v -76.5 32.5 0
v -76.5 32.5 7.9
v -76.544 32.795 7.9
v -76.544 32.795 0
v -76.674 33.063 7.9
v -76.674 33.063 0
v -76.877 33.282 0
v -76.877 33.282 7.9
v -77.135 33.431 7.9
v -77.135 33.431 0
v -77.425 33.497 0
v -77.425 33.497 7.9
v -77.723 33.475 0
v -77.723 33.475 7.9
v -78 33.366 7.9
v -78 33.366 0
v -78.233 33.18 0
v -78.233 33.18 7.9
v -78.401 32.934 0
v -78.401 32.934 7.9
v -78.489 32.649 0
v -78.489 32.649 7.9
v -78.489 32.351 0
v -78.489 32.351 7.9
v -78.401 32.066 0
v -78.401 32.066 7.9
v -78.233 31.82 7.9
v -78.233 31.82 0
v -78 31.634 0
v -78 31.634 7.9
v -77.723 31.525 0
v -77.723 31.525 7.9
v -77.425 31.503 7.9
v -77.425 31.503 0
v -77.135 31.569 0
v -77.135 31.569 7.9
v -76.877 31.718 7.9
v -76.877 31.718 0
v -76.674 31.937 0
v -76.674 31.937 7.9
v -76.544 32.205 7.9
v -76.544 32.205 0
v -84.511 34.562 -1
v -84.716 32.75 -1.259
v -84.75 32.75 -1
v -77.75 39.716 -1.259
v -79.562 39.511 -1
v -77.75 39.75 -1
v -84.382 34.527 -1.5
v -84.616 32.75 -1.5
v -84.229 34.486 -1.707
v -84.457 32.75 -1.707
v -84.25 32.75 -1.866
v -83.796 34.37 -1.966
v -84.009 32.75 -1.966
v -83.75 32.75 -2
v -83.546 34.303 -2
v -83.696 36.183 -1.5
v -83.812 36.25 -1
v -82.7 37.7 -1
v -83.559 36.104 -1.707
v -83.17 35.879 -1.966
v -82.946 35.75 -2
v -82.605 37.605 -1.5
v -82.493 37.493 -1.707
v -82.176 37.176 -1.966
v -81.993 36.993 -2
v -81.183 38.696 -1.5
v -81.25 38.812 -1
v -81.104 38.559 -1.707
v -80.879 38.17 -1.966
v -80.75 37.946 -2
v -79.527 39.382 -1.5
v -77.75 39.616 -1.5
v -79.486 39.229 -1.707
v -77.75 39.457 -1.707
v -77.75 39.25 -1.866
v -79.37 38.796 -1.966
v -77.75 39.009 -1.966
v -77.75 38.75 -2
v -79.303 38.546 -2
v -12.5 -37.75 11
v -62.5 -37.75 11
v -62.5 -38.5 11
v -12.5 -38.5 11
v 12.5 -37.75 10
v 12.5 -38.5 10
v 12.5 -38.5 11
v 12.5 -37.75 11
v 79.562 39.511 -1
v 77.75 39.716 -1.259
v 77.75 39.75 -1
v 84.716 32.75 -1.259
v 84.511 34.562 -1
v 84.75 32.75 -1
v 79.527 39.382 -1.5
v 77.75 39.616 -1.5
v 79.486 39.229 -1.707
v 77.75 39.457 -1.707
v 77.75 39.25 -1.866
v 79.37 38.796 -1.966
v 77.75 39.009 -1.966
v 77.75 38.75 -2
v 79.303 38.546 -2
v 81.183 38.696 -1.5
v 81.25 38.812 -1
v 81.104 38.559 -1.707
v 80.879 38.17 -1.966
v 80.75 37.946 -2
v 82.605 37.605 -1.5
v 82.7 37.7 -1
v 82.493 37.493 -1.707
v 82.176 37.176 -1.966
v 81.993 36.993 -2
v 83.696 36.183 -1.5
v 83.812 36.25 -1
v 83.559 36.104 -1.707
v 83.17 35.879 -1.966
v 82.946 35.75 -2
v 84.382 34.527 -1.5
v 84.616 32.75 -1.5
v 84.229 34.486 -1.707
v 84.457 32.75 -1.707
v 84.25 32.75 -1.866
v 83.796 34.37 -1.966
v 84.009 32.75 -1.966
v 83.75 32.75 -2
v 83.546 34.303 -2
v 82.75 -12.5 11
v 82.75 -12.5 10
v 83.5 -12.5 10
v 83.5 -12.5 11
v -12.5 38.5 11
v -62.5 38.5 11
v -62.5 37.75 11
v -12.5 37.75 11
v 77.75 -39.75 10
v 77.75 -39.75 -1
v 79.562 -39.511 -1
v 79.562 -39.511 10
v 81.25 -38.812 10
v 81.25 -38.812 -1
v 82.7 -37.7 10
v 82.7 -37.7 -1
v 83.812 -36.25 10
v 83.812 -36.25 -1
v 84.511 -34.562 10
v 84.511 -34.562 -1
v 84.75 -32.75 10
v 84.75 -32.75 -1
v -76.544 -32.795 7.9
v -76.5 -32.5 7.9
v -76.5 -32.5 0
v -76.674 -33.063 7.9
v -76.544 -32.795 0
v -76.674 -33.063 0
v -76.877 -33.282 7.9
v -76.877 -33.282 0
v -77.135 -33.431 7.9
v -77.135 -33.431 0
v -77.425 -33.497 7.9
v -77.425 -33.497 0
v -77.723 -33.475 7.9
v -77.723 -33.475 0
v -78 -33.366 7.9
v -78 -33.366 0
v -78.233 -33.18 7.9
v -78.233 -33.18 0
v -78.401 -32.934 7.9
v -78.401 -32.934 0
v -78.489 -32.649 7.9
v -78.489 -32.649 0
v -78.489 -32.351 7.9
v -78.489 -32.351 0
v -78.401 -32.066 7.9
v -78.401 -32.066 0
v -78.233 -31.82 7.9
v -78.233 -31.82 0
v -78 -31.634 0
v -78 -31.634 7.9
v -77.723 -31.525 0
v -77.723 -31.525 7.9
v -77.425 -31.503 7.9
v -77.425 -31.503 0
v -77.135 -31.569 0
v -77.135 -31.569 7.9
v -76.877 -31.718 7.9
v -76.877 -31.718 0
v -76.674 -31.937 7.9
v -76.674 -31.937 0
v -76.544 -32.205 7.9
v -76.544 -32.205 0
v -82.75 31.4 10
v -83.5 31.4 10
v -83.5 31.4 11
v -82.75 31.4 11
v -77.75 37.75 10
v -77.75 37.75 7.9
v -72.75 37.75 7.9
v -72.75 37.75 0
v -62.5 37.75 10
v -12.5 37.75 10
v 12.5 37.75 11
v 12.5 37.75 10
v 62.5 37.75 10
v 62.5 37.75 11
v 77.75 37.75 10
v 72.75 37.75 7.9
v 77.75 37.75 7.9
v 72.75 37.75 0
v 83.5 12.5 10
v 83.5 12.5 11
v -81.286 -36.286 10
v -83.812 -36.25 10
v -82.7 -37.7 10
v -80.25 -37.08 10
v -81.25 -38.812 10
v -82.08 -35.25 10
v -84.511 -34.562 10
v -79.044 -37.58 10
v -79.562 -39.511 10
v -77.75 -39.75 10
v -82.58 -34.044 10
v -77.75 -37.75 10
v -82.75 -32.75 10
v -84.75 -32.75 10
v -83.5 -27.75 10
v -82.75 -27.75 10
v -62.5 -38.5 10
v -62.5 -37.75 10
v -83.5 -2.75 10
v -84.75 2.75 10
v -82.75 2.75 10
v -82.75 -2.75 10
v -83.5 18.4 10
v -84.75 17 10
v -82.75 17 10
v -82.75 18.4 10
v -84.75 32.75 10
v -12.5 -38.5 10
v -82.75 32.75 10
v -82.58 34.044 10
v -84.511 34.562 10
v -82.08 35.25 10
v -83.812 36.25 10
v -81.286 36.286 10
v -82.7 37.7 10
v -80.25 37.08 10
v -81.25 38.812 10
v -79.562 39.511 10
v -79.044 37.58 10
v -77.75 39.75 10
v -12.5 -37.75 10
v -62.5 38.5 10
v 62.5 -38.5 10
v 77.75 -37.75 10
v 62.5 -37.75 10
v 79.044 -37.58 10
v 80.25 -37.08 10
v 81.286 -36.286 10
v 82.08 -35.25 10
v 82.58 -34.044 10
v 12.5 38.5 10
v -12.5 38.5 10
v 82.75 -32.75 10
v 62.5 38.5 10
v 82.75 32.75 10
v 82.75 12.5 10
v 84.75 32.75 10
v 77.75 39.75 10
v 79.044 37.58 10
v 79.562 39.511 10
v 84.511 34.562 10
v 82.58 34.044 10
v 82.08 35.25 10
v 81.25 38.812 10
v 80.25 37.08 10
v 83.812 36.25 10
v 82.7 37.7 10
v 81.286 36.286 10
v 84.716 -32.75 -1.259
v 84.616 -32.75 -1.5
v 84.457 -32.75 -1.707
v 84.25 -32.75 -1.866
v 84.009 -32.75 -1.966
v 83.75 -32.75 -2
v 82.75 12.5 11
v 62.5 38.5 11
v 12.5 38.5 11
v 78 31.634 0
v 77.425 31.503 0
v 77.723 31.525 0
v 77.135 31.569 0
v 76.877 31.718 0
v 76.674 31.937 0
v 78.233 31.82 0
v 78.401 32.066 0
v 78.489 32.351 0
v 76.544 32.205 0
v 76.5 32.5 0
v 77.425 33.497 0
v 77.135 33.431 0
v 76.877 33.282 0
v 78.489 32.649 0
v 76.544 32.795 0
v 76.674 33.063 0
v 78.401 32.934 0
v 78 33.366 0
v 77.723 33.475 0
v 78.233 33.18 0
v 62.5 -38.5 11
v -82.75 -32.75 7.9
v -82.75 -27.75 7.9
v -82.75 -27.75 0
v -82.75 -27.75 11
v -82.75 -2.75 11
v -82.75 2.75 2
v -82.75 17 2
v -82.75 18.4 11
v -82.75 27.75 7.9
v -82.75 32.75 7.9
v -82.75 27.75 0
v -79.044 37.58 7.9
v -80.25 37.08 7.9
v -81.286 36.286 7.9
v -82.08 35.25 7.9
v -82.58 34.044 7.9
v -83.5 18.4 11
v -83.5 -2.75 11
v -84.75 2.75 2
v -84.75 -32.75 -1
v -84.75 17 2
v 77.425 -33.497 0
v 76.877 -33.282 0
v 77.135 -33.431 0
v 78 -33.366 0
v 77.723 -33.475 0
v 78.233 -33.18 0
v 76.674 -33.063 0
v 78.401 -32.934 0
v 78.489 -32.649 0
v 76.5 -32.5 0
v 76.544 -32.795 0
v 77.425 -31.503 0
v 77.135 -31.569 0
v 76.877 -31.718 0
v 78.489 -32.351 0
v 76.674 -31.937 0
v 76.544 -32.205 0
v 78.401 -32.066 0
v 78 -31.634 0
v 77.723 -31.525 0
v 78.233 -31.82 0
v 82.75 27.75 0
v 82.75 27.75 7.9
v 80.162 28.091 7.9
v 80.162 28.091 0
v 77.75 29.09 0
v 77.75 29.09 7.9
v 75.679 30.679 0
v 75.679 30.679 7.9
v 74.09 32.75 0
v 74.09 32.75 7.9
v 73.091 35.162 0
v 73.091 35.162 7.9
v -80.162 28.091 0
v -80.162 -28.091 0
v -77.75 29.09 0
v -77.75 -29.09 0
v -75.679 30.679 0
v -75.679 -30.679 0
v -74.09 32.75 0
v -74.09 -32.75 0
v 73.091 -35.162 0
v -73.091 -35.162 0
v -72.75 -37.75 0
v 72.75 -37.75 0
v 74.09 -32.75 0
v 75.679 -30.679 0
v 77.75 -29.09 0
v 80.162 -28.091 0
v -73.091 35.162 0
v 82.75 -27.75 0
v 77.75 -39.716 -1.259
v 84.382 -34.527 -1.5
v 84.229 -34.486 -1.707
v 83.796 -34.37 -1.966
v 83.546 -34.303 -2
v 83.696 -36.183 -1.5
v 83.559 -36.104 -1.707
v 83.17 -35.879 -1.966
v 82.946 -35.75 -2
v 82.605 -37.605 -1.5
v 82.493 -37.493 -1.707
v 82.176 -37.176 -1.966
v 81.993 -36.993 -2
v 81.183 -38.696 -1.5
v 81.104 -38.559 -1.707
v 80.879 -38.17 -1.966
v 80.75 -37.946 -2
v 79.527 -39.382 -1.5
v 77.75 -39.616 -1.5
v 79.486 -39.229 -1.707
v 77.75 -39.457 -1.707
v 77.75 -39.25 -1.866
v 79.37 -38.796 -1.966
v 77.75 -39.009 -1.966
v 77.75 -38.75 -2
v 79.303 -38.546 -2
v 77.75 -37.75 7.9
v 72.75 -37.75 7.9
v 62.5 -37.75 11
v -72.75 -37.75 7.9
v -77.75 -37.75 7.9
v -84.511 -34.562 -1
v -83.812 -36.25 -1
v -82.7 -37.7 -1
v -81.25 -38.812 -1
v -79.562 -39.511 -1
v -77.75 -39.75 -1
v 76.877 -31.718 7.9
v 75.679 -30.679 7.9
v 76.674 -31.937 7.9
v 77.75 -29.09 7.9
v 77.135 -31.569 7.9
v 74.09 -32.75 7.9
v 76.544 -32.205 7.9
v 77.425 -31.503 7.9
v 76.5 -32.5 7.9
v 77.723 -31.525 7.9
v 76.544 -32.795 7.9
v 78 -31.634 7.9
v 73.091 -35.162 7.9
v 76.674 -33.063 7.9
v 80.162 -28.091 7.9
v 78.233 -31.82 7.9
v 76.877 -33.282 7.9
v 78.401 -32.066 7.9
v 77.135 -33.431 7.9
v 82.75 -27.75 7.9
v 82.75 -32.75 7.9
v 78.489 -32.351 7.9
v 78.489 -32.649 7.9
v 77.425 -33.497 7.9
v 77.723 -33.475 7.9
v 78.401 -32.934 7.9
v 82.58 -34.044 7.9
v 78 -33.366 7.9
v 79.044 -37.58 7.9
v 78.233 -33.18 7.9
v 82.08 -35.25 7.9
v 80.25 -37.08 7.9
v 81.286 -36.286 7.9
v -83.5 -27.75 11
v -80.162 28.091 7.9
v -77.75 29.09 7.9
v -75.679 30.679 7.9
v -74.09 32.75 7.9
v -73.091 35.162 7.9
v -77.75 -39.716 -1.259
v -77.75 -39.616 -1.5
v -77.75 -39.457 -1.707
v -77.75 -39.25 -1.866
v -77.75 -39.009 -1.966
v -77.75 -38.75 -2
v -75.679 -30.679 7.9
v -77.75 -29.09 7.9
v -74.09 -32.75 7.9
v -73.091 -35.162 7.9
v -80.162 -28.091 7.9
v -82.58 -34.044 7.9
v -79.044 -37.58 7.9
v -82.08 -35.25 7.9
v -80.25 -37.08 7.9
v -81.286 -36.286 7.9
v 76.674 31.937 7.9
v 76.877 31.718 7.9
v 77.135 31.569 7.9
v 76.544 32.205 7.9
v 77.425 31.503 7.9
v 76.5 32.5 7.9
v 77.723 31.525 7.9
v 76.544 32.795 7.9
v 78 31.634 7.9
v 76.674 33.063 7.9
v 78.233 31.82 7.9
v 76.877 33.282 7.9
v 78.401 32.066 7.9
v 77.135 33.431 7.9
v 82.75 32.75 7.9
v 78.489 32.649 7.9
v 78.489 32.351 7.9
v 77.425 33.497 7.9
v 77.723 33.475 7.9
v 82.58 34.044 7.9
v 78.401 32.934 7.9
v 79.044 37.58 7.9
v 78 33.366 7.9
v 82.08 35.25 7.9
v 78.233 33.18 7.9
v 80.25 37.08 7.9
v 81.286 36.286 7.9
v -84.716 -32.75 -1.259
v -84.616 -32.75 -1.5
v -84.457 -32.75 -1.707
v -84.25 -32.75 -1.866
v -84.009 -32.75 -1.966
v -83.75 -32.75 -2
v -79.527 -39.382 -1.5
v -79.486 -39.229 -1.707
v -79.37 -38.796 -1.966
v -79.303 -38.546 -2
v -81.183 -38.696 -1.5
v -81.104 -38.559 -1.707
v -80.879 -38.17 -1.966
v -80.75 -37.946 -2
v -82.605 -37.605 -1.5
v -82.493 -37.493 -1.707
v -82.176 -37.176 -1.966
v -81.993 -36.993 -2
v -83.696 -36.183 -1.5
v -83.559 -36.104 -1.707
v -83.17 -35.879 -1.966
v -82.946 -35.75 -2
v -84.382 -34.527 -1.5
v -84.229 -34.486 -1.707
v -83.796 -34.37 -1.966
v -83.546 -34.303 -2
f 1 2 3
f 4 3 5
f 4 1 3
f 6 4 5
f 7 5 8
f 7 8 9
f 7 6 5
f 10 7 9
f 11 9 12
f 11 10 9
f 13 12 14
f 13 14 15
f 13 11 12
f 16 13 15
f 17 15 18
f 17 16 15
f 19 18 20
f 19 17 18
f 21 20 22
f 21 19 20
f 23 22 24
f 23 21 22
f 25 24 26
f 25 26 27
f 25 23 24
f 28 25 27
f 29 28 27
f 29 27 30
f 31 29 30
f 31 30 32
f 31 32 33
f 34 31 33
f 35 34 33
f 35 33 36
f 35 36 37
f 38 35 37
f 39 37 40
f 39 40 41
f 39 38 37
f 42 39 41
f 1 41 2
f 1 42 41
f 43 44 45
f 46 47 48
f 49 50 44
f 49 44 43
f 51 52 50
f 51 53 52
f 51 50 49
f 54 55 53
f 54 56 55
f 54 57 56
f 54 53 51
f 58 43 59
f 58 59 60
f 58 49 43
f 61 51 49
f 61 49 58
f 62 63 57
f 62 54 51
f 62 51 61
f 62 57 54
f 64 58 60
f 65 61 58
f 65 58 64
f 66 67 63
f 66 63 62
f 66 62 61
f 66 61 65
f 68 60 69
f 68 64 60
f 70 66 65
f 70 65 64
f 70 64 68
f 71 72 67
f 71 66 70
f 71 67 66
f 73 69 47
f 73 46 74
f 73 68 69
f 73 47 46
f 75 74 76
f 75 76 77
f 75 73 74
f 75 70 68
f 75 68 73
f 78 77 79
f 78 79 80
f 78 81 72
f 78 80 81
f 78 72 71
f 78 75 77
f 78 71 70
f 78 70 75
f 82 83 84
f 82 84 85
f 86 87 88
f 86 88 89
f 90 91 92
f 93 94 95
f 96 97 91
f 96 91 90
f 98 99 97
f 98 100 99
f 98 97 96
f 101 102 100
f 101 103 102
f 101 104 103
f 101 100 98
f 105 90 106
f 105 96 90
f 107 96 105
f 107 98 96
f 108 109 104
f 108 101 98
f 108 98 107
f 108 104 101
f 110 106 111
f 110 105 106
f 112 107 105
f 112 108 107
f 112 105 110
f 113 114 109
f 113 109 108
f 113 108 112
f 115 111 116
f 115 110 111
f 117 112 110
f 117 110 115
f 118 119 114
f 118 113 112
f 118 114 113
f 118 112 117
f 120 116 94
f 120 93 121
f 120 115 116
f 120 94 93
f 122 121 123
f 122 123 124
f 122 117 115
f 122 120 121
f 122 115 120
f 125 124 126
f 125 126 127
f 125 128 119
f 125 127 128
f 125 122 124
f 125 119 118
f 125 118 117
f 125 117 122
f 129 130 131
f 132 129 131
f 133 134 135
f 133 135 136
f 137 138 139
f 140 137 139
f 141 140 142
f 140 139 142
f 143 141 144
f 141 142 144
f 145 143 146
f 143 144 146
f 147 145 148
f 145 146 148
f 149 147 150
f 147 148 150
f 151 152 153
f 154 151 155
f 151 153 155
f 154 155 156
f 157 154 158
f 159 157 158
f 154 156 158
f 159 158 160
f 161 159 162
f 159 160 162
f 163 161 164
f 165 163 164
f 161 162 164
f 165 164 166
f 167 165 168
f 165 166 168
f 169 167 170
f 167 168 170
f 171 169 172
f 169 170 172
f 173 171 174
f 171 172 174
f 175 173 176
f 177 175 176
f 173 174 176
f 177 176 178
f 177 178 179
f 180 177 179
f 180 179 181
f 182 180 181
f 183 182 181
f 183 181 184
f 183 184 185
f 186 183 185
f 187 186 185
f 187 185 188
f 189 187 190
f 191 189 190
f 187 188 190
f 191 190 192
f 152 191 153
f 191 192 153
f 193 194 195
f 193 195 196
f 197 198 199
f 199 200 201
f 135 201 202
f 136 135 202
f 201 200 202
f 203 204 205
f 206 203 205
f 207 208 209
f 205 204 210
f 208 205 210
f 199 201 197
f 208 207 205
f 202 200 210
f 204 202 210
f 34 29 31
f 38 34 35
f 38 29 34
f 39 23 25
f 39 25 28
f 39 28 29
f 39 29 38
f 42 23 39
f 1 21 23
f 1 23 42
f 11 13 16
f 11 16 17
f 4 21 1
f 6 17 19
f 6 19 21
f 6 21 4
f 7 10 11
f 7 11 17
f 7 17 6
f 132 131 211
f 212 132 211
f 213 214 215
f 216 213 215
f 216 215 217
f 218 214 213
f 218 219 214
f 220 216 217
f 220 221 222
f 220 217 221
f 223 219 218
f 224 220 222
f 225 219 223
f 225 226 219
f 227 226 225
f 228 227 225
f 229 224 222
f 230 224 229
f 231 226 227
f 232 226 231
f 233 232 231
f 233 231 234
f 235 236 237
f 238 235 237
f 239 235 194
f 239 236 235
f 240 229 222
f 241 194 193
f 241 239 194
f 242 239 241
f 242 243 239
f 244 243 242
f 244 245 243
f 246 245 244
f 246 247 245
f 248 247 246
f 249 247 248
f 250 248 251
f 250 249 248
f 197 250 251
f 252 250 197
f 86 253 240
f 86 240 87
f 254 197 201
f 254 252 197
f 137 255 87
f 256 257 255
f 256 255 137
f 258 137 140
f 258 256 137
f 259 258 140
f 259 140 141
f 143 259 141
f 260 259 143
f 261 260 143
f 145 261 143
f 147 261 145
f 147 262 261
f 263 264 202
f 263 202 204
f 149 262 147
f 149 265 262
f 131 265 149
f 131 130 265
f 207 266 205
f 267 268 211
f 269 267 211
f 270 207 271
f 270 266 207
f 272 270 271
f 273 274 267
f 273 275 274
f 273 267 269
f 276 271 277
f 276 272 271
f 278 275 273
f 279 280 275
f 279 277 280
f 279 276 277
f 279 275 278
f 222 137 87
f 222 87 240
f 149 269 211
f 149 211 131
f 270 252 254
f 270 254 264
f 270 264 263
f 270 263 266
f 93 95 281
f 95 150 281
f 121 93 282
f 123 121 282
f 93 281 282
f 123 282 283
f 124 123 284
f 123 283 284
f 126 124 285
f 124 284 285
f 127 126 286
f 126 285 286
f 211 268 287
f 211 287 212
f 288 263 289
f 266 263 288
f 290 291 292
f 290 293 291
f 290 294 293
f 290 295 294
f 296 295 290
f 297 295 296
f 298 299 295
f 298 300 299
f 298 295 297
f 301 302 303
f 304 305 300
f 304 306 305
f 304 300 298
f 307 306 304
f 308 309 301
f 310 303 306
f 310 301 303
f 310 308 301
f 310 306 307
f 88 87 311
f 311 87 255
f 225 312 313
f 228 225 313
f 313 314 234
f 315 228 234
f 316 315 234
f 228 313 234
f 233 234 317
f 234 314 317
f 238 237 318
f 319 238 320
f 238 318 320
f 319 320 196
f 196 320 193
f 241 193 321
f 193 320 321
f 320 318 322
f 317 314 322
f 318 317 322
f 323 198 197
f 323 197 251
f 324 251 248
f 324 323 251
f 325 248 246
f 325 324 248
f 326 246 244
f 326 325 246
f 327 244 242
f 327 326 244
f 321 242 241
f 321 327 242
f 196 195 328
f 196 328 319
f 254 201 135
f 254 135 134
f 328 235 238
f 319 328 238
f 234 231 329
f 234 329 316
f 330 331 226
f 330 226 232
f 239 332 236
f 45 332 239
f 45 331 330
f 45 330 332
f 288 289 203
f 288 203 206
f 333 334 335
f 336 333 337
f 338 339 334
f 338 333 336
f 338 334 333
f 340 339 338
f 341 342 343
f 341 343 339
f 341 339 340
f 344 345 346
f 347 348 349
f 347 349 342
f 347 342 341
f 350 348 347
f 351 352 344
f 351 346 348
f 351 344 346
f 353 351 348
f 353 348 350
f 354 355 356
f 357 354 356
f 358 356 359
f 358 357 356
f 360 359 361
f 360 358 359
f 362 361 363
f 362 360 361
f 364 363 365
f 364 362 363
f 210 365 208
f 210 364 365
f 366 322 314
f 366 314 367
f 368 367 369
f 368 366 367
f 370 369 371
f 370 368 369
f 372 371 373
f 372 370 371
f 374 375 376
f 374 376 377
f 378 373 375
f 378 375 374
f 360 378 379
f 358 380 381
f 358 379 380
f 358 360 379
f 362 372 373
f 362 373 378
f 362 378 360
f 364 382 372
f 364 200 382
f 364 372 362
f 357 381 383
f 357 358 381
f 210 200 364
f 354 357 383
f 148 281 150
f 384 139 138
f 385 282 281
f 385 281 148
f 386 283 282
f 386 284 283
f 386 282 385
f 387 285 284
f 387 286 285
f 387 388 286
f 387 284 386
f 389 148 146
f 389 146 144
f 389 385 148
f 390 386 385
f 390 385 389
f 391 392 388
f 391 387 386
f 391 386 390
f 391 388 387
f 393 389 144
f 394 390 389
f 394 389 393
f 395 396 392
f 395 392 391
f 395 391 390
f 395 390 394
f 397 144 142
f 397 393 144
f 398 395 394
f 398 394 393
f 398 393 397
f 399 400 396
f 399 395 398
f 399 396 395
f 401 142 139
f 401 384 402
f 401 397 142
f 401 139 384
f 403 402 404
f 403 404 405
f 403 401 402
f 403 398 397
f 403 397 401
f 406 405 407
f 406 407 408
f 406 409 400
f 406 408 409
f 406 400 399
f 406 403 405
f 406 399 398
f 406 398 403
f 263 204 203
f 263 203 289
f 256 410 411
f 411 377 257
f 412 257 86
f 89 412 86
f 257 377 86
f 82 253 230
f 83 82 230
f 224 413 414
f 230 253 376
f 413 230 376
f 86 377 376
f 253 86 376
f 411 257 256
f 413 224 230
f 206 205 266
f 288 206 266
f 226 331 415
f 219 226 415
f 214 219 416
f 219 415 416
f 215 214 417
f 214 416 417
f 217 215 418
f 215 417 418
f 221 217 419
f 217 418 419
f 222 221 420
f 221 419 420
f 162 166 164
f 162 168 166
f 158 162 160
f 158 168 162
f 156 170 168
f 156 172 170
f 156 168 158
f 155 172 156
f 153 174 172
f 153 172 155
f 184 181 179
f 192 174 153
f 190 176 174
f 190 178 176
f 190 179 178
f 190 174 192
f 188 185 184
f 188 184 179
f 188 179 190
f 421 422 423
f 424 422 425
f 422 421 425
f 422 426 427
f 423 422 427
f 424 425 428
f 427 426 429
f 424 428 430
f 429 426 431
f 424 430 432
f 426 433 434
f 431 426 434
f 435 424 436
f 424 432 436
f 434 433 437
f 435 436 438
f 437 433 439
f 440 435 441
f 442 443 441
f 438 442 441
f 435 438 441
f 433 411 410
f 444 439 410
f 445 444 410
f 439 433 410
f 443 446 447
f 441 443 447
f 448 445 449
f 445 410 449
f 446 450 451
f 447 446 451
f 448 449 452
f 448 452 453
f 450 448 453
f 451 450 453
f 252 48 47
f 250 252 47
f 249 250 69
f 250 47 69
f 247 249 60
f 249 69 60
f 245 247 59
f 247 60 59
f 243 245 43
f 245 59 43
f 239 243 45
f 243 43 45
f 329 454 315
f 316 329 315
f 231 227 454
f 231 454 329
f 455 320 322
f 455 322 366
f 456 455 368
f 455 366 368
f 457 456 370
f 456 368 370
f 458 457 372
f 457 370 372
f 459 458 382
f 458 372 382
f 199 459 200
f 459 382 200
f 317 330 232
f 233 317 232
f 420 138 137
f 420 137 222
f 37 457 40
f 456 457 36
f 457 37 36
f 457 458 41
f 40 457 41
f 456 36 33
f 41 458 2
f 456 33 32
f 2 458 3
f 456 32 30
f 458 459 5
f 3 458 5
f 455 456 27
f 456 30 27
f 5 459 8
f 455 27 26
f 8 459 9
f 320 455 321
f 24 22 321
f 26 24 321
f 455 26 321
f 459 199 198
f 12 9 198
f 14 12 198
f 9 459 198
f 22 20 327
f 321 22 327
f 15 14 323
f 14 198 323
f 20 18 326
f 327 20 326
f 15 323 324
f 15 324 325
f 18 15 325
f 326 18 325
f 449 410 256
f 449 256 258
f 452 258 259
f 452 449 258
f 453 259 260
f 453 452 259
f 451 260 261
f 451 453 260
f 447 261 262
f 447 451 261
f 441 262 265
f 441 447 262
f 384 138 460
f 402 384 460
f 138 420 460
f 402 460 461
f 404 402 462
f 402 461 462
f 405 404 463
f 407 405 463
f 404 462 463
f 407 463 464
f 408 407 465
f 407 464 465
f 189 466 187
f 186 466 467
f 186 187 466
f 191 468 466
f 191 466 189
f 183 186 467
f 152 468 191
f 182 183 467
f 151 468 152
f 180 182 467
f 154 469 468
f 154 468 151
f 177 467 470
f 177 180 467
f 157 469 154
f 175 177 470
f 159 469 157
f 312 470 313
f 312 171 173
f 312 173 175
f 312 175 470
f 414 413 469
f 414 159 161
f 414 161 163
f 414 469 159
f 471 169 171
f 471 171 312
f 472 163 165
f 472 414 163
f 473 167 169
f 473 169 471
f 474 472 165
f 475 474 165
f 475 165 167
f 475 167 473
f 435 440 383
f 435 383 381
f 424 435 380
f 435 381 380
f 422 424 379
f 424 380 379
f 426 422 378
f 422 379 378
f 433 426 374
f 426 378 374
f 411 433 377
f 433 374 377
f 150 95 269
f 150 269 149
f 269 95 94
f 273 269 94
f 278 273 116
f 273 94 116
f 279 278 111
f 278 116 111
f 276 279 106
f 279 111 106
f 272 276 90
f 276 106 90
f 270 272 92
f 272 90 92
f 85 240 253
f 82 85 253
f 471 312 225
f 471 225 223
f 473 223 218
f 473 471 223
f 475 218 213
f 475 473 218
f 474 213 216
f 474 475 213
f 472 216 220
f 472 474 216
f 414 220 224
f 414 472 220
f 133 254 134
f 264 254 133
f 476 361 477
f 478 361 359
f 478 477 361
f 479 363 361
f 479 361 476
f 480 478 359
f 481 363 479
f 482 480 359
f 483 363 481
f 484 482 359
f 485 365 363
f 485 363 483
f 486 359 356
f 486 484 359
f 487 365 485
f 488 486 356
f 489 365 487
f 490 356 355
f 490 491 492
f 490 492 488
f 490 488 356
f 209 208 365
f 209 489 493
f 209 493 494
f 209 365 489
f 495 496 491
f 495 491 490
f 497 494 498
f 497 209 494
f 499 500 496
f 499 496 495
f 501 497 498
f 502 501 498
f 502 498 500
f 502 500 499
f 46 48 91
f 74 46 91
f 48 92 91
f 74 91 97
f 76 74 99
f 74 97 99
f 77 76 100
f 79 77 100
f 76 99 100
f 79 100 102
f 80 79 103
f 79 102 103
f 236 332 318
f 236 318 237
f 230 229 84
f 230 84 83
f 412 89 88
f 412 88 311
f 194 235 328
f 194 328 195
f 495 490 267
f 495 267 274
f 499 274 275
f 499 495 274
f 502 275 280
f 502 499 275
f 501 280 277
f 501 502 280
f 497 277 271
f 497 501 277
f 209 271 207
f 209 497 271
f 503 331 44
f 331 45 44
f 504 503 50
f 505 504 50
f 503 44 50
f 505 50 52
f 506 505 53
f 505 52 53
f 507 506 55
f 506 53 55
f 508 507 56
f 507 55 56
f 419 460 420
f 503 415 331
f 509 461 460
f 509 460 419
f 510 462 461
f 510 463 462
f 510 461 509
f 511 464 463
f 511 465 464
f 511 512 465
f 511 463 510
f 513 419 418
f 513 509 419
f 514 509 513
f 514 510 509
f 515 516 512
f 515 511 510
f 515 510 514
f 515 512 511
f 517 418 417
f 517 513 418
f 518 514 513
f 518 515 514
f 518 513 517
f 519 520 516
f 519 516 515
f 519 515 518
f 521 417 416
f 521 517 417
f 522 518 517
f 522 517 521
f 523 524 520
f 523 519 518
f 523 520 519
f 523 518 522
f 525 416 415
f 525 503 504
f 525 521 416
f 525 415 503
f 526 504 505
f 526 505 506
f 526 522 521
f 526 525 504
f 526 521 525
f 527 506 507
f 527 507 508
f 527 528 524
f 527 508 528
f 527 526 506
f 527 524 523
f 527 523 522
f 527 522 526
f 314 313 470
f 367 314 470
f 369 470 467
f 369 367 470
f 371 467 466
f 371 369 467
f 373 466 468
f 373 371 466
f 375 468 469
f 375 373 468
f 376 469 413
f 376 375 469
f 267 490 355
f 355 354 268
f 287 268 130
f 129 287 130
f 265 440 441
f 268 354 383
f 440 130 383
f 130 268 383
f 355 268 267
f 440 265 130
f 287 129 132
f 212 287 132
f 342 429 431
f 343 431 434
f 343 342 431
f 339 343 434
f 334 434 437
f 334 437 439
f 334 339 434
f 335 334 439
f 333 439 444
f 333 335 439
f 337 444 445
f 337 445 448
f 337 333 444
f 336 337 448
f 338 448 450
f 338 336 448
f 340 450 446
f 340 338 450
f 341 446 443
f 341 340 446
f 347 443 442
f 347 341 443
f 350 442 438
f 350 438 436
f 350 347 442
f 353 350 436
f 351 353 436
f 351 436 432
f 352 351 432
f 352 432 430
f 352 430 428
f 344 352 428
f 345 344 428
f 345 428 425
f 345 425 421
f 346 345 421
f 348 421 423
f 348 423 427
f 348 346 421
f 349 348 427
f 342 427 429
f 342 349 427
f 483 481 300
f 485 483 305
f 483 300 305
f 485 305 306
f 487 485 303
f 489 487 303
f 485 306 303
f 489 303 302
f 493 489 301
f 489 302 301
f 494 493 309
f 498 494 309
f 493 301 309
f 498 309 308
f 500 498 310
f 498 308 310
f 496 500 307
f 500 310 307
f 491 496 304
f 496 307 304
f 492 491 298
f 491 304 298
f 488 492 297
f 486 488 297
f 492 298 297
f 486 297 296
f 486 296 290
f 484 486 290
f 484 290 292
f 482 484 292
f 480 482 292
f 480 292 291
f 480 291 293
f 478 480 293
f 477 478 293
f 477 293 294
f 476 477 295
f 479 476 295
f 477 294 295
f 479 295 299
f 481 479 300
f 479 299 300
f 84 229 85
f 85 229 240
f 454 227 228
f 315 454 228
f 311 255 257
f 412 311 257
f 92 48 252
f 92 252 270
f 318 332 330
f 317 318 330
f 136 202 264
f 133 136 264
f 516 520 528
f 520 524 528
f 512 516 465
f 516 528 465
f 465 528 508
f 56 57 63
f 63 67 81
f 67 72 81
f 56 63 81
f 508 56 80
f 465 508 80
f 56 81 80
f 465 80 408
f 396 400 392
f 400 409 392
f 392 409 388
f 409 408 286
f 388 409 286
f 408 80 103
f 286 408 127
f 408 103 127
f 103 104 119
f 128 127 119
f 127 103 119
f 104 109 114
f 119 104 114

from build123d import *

# Parameters (mm, degrees)
PAD_DEPTH               = 10
THICKNESS_T             = 2
SKETCH001_R             = 1
PAD001_DEPTH            = 7.9
SKETCH001_MIRRORED_2_R  = 1
PAD001_MIRRORED_2_DEPTH = 7.9
SKETCH003_W             = 14.25
SKETCH003_H             = 8
POCKET_DEPTH            = 5
FILLET_R                = 1
SKETCH004_W             = 50
SKETCH004_H             = 0.75
SKETCH004_W_2           = 0.75
SKETCH004_H_2           = 25
SKETCH004_H_3           = 13
PAD002_DEPTH            = 1


with BuildPart() as part:
    # Sketch → Pad (new body)
    with BuildSketch(Plane.XY):
        with BuildLine():
            ThreePointArc((-77.75, 37.75), (-81.285534, 36.285534), (-82.75, 32.75))
            Line((-82.75, -32.75), (-82.75, 32.75))
            ThreePointArc((-82.75, -32.75), (-81.285534, -36.285534), (-77.75, -37.75))
            Line((77.75, -37.75), (-77.75, -37.75))
            ThreePointArc((77.75, -37.75), (81.285534, -36.285534), (82.75, -32.75))
            Line((82.75, 32.75), (82.75, -32.75))
            ThreePointArc((82.75, 32.75), (81.285534, 36.285534), (77.75, 37.75))
            Line((-77.75, 37.75), (77.75, 37.75))
        make_face()
    extrude(amount=PAD_DEPTH)

    # Thickness
    thickness_openings = [part.faces().sort_by_distance(p)[0] for p in [
        (0, 0, 10),
    ]]
    offset(amount=THICKNESS_T, openings=thickness_openings, kind=Kind.INTERSECTION)

    # Sketch001 (on Face9 of Thickness) → Pad001 (join)
    with BuildSketch(Plane.XY):
        with BuildLine():
            Line((-77.75, 37.75), (-72.75, 37.75))
            ThreePointArc((-82.75, 27.75), (-75.678932, 30.678932), (-72.75, 37.75))
            Line((-82.75, 32.75), (-82.75, 27.75))
            ThreePointArc((-77.75, 37.75), (-81.285534, 36.285534), (-82.75, 32.75))
        make_face()
        with Locations((-77.5, 32.5)):
            Circle(SKETCH001_R, mode=Mode.SUBTRACT)
    pad001 = extrude(amount=PAD001_DEPTH)

    # Sketch001 Mirrored 2 → Pad001 Mirrored 2 (add)
    with BuildSketch(Plane(origin=(0, 0, 0), x_dir=(-1, 0, 0), z_dir=(0, 0, -1))):
        with BuildLine():
            Line((-77.75, 37.75), (-72.75, 37.75))
            ThreePointArc((-82.75, 27.75), (-75.678932, 30.678932), (-72.75, 37.75))
            Line((-82.75, 32.75), (-82.75, 27.75))
            ThreePointArc((-77.75, 37.75), (-81.285534, 36.285534), (-82.75, 32.75))
        make_face()
        with Locations((-77.5, 32.5)):
            Circle(SKETCH001_MIRRORED_2_R, mode=Mode.SUBTRACT)
    pad001_mirrored_2 = extrude(amount=-PAD001_MIRRORED_2_DEPTH)

    # Mirrored001: Pad001, Pad001 Mirrored 2 across Sketch001 H_Axis
    add(pad001.mirror(Plane.ZX))
    add(pad001_mirrored_2.mirror(Plane.ZX))

    # Sketch003 (on Face19 of MultiTransform) → Pocket (cut)
    with BuildSketch(Plane(origin=(-84.75, 0, 0), x_dir=(0, -1, 0), z_dir=(-1, 0, 0))):
        with Locations((-9.875, 6)):
            Rectangle(SKETCH003_W, SKETCH003_H)
    extrude(amount=-POCKET_DEPTH, mode=Mode.SUBTRACT)

    # Fillet
    fillet_edges = [part.edges().sort_by_distance(p)[0] for p in [
        (0, 39.75, -2),
        (82.699747, 37.699747, -2),
        (84.75, 0, -2),
        (82.699747, -37.699747, -2),
        (0, -39.75, -2),
        (-82.699747, -37.699747, -2),
        (-84.75, 0, -2),
        (-82.699747, 37.699747, -2),
    ]]
    fillet(fillet_edges, radius=FILLET_R)

    # Sketch004 (on Face4 of Fillet) → Pad002 (join)
    with BuildSketch(Plane.XY.offset(10)):
        with Locations((-37.5, 38.125)):
            Rectangle(SKETCH004_W, SKETCH004_H)
        with Locations((37.5, 38.125)):
            Rectangle(SKETCH004_W, SKETCH004_H)
        with Locations((83.125, 0)):
            Rectangle(SKETCH004_W_2, SKETCH004_H_2)
        with Locations((-37.5, -38.125)):
            Rectangle(SKETCH004_W, SKETCH004_H)
        with Locations((37.5, -38.125)):
            Rectangle(SKETCH004_W, SKETCH004_H)
        with Locations((-83.125, -15.25)):
            Rectangle(SKETCH004_W_2, SKETCH004_H_2)
        with Locations((-83.125, 24.9)):
            Rectangle(SKETCH004_W_2, SKETCH004_H_3)
    extrude(amount=PAD002_DEPTH)


solid = part.part
